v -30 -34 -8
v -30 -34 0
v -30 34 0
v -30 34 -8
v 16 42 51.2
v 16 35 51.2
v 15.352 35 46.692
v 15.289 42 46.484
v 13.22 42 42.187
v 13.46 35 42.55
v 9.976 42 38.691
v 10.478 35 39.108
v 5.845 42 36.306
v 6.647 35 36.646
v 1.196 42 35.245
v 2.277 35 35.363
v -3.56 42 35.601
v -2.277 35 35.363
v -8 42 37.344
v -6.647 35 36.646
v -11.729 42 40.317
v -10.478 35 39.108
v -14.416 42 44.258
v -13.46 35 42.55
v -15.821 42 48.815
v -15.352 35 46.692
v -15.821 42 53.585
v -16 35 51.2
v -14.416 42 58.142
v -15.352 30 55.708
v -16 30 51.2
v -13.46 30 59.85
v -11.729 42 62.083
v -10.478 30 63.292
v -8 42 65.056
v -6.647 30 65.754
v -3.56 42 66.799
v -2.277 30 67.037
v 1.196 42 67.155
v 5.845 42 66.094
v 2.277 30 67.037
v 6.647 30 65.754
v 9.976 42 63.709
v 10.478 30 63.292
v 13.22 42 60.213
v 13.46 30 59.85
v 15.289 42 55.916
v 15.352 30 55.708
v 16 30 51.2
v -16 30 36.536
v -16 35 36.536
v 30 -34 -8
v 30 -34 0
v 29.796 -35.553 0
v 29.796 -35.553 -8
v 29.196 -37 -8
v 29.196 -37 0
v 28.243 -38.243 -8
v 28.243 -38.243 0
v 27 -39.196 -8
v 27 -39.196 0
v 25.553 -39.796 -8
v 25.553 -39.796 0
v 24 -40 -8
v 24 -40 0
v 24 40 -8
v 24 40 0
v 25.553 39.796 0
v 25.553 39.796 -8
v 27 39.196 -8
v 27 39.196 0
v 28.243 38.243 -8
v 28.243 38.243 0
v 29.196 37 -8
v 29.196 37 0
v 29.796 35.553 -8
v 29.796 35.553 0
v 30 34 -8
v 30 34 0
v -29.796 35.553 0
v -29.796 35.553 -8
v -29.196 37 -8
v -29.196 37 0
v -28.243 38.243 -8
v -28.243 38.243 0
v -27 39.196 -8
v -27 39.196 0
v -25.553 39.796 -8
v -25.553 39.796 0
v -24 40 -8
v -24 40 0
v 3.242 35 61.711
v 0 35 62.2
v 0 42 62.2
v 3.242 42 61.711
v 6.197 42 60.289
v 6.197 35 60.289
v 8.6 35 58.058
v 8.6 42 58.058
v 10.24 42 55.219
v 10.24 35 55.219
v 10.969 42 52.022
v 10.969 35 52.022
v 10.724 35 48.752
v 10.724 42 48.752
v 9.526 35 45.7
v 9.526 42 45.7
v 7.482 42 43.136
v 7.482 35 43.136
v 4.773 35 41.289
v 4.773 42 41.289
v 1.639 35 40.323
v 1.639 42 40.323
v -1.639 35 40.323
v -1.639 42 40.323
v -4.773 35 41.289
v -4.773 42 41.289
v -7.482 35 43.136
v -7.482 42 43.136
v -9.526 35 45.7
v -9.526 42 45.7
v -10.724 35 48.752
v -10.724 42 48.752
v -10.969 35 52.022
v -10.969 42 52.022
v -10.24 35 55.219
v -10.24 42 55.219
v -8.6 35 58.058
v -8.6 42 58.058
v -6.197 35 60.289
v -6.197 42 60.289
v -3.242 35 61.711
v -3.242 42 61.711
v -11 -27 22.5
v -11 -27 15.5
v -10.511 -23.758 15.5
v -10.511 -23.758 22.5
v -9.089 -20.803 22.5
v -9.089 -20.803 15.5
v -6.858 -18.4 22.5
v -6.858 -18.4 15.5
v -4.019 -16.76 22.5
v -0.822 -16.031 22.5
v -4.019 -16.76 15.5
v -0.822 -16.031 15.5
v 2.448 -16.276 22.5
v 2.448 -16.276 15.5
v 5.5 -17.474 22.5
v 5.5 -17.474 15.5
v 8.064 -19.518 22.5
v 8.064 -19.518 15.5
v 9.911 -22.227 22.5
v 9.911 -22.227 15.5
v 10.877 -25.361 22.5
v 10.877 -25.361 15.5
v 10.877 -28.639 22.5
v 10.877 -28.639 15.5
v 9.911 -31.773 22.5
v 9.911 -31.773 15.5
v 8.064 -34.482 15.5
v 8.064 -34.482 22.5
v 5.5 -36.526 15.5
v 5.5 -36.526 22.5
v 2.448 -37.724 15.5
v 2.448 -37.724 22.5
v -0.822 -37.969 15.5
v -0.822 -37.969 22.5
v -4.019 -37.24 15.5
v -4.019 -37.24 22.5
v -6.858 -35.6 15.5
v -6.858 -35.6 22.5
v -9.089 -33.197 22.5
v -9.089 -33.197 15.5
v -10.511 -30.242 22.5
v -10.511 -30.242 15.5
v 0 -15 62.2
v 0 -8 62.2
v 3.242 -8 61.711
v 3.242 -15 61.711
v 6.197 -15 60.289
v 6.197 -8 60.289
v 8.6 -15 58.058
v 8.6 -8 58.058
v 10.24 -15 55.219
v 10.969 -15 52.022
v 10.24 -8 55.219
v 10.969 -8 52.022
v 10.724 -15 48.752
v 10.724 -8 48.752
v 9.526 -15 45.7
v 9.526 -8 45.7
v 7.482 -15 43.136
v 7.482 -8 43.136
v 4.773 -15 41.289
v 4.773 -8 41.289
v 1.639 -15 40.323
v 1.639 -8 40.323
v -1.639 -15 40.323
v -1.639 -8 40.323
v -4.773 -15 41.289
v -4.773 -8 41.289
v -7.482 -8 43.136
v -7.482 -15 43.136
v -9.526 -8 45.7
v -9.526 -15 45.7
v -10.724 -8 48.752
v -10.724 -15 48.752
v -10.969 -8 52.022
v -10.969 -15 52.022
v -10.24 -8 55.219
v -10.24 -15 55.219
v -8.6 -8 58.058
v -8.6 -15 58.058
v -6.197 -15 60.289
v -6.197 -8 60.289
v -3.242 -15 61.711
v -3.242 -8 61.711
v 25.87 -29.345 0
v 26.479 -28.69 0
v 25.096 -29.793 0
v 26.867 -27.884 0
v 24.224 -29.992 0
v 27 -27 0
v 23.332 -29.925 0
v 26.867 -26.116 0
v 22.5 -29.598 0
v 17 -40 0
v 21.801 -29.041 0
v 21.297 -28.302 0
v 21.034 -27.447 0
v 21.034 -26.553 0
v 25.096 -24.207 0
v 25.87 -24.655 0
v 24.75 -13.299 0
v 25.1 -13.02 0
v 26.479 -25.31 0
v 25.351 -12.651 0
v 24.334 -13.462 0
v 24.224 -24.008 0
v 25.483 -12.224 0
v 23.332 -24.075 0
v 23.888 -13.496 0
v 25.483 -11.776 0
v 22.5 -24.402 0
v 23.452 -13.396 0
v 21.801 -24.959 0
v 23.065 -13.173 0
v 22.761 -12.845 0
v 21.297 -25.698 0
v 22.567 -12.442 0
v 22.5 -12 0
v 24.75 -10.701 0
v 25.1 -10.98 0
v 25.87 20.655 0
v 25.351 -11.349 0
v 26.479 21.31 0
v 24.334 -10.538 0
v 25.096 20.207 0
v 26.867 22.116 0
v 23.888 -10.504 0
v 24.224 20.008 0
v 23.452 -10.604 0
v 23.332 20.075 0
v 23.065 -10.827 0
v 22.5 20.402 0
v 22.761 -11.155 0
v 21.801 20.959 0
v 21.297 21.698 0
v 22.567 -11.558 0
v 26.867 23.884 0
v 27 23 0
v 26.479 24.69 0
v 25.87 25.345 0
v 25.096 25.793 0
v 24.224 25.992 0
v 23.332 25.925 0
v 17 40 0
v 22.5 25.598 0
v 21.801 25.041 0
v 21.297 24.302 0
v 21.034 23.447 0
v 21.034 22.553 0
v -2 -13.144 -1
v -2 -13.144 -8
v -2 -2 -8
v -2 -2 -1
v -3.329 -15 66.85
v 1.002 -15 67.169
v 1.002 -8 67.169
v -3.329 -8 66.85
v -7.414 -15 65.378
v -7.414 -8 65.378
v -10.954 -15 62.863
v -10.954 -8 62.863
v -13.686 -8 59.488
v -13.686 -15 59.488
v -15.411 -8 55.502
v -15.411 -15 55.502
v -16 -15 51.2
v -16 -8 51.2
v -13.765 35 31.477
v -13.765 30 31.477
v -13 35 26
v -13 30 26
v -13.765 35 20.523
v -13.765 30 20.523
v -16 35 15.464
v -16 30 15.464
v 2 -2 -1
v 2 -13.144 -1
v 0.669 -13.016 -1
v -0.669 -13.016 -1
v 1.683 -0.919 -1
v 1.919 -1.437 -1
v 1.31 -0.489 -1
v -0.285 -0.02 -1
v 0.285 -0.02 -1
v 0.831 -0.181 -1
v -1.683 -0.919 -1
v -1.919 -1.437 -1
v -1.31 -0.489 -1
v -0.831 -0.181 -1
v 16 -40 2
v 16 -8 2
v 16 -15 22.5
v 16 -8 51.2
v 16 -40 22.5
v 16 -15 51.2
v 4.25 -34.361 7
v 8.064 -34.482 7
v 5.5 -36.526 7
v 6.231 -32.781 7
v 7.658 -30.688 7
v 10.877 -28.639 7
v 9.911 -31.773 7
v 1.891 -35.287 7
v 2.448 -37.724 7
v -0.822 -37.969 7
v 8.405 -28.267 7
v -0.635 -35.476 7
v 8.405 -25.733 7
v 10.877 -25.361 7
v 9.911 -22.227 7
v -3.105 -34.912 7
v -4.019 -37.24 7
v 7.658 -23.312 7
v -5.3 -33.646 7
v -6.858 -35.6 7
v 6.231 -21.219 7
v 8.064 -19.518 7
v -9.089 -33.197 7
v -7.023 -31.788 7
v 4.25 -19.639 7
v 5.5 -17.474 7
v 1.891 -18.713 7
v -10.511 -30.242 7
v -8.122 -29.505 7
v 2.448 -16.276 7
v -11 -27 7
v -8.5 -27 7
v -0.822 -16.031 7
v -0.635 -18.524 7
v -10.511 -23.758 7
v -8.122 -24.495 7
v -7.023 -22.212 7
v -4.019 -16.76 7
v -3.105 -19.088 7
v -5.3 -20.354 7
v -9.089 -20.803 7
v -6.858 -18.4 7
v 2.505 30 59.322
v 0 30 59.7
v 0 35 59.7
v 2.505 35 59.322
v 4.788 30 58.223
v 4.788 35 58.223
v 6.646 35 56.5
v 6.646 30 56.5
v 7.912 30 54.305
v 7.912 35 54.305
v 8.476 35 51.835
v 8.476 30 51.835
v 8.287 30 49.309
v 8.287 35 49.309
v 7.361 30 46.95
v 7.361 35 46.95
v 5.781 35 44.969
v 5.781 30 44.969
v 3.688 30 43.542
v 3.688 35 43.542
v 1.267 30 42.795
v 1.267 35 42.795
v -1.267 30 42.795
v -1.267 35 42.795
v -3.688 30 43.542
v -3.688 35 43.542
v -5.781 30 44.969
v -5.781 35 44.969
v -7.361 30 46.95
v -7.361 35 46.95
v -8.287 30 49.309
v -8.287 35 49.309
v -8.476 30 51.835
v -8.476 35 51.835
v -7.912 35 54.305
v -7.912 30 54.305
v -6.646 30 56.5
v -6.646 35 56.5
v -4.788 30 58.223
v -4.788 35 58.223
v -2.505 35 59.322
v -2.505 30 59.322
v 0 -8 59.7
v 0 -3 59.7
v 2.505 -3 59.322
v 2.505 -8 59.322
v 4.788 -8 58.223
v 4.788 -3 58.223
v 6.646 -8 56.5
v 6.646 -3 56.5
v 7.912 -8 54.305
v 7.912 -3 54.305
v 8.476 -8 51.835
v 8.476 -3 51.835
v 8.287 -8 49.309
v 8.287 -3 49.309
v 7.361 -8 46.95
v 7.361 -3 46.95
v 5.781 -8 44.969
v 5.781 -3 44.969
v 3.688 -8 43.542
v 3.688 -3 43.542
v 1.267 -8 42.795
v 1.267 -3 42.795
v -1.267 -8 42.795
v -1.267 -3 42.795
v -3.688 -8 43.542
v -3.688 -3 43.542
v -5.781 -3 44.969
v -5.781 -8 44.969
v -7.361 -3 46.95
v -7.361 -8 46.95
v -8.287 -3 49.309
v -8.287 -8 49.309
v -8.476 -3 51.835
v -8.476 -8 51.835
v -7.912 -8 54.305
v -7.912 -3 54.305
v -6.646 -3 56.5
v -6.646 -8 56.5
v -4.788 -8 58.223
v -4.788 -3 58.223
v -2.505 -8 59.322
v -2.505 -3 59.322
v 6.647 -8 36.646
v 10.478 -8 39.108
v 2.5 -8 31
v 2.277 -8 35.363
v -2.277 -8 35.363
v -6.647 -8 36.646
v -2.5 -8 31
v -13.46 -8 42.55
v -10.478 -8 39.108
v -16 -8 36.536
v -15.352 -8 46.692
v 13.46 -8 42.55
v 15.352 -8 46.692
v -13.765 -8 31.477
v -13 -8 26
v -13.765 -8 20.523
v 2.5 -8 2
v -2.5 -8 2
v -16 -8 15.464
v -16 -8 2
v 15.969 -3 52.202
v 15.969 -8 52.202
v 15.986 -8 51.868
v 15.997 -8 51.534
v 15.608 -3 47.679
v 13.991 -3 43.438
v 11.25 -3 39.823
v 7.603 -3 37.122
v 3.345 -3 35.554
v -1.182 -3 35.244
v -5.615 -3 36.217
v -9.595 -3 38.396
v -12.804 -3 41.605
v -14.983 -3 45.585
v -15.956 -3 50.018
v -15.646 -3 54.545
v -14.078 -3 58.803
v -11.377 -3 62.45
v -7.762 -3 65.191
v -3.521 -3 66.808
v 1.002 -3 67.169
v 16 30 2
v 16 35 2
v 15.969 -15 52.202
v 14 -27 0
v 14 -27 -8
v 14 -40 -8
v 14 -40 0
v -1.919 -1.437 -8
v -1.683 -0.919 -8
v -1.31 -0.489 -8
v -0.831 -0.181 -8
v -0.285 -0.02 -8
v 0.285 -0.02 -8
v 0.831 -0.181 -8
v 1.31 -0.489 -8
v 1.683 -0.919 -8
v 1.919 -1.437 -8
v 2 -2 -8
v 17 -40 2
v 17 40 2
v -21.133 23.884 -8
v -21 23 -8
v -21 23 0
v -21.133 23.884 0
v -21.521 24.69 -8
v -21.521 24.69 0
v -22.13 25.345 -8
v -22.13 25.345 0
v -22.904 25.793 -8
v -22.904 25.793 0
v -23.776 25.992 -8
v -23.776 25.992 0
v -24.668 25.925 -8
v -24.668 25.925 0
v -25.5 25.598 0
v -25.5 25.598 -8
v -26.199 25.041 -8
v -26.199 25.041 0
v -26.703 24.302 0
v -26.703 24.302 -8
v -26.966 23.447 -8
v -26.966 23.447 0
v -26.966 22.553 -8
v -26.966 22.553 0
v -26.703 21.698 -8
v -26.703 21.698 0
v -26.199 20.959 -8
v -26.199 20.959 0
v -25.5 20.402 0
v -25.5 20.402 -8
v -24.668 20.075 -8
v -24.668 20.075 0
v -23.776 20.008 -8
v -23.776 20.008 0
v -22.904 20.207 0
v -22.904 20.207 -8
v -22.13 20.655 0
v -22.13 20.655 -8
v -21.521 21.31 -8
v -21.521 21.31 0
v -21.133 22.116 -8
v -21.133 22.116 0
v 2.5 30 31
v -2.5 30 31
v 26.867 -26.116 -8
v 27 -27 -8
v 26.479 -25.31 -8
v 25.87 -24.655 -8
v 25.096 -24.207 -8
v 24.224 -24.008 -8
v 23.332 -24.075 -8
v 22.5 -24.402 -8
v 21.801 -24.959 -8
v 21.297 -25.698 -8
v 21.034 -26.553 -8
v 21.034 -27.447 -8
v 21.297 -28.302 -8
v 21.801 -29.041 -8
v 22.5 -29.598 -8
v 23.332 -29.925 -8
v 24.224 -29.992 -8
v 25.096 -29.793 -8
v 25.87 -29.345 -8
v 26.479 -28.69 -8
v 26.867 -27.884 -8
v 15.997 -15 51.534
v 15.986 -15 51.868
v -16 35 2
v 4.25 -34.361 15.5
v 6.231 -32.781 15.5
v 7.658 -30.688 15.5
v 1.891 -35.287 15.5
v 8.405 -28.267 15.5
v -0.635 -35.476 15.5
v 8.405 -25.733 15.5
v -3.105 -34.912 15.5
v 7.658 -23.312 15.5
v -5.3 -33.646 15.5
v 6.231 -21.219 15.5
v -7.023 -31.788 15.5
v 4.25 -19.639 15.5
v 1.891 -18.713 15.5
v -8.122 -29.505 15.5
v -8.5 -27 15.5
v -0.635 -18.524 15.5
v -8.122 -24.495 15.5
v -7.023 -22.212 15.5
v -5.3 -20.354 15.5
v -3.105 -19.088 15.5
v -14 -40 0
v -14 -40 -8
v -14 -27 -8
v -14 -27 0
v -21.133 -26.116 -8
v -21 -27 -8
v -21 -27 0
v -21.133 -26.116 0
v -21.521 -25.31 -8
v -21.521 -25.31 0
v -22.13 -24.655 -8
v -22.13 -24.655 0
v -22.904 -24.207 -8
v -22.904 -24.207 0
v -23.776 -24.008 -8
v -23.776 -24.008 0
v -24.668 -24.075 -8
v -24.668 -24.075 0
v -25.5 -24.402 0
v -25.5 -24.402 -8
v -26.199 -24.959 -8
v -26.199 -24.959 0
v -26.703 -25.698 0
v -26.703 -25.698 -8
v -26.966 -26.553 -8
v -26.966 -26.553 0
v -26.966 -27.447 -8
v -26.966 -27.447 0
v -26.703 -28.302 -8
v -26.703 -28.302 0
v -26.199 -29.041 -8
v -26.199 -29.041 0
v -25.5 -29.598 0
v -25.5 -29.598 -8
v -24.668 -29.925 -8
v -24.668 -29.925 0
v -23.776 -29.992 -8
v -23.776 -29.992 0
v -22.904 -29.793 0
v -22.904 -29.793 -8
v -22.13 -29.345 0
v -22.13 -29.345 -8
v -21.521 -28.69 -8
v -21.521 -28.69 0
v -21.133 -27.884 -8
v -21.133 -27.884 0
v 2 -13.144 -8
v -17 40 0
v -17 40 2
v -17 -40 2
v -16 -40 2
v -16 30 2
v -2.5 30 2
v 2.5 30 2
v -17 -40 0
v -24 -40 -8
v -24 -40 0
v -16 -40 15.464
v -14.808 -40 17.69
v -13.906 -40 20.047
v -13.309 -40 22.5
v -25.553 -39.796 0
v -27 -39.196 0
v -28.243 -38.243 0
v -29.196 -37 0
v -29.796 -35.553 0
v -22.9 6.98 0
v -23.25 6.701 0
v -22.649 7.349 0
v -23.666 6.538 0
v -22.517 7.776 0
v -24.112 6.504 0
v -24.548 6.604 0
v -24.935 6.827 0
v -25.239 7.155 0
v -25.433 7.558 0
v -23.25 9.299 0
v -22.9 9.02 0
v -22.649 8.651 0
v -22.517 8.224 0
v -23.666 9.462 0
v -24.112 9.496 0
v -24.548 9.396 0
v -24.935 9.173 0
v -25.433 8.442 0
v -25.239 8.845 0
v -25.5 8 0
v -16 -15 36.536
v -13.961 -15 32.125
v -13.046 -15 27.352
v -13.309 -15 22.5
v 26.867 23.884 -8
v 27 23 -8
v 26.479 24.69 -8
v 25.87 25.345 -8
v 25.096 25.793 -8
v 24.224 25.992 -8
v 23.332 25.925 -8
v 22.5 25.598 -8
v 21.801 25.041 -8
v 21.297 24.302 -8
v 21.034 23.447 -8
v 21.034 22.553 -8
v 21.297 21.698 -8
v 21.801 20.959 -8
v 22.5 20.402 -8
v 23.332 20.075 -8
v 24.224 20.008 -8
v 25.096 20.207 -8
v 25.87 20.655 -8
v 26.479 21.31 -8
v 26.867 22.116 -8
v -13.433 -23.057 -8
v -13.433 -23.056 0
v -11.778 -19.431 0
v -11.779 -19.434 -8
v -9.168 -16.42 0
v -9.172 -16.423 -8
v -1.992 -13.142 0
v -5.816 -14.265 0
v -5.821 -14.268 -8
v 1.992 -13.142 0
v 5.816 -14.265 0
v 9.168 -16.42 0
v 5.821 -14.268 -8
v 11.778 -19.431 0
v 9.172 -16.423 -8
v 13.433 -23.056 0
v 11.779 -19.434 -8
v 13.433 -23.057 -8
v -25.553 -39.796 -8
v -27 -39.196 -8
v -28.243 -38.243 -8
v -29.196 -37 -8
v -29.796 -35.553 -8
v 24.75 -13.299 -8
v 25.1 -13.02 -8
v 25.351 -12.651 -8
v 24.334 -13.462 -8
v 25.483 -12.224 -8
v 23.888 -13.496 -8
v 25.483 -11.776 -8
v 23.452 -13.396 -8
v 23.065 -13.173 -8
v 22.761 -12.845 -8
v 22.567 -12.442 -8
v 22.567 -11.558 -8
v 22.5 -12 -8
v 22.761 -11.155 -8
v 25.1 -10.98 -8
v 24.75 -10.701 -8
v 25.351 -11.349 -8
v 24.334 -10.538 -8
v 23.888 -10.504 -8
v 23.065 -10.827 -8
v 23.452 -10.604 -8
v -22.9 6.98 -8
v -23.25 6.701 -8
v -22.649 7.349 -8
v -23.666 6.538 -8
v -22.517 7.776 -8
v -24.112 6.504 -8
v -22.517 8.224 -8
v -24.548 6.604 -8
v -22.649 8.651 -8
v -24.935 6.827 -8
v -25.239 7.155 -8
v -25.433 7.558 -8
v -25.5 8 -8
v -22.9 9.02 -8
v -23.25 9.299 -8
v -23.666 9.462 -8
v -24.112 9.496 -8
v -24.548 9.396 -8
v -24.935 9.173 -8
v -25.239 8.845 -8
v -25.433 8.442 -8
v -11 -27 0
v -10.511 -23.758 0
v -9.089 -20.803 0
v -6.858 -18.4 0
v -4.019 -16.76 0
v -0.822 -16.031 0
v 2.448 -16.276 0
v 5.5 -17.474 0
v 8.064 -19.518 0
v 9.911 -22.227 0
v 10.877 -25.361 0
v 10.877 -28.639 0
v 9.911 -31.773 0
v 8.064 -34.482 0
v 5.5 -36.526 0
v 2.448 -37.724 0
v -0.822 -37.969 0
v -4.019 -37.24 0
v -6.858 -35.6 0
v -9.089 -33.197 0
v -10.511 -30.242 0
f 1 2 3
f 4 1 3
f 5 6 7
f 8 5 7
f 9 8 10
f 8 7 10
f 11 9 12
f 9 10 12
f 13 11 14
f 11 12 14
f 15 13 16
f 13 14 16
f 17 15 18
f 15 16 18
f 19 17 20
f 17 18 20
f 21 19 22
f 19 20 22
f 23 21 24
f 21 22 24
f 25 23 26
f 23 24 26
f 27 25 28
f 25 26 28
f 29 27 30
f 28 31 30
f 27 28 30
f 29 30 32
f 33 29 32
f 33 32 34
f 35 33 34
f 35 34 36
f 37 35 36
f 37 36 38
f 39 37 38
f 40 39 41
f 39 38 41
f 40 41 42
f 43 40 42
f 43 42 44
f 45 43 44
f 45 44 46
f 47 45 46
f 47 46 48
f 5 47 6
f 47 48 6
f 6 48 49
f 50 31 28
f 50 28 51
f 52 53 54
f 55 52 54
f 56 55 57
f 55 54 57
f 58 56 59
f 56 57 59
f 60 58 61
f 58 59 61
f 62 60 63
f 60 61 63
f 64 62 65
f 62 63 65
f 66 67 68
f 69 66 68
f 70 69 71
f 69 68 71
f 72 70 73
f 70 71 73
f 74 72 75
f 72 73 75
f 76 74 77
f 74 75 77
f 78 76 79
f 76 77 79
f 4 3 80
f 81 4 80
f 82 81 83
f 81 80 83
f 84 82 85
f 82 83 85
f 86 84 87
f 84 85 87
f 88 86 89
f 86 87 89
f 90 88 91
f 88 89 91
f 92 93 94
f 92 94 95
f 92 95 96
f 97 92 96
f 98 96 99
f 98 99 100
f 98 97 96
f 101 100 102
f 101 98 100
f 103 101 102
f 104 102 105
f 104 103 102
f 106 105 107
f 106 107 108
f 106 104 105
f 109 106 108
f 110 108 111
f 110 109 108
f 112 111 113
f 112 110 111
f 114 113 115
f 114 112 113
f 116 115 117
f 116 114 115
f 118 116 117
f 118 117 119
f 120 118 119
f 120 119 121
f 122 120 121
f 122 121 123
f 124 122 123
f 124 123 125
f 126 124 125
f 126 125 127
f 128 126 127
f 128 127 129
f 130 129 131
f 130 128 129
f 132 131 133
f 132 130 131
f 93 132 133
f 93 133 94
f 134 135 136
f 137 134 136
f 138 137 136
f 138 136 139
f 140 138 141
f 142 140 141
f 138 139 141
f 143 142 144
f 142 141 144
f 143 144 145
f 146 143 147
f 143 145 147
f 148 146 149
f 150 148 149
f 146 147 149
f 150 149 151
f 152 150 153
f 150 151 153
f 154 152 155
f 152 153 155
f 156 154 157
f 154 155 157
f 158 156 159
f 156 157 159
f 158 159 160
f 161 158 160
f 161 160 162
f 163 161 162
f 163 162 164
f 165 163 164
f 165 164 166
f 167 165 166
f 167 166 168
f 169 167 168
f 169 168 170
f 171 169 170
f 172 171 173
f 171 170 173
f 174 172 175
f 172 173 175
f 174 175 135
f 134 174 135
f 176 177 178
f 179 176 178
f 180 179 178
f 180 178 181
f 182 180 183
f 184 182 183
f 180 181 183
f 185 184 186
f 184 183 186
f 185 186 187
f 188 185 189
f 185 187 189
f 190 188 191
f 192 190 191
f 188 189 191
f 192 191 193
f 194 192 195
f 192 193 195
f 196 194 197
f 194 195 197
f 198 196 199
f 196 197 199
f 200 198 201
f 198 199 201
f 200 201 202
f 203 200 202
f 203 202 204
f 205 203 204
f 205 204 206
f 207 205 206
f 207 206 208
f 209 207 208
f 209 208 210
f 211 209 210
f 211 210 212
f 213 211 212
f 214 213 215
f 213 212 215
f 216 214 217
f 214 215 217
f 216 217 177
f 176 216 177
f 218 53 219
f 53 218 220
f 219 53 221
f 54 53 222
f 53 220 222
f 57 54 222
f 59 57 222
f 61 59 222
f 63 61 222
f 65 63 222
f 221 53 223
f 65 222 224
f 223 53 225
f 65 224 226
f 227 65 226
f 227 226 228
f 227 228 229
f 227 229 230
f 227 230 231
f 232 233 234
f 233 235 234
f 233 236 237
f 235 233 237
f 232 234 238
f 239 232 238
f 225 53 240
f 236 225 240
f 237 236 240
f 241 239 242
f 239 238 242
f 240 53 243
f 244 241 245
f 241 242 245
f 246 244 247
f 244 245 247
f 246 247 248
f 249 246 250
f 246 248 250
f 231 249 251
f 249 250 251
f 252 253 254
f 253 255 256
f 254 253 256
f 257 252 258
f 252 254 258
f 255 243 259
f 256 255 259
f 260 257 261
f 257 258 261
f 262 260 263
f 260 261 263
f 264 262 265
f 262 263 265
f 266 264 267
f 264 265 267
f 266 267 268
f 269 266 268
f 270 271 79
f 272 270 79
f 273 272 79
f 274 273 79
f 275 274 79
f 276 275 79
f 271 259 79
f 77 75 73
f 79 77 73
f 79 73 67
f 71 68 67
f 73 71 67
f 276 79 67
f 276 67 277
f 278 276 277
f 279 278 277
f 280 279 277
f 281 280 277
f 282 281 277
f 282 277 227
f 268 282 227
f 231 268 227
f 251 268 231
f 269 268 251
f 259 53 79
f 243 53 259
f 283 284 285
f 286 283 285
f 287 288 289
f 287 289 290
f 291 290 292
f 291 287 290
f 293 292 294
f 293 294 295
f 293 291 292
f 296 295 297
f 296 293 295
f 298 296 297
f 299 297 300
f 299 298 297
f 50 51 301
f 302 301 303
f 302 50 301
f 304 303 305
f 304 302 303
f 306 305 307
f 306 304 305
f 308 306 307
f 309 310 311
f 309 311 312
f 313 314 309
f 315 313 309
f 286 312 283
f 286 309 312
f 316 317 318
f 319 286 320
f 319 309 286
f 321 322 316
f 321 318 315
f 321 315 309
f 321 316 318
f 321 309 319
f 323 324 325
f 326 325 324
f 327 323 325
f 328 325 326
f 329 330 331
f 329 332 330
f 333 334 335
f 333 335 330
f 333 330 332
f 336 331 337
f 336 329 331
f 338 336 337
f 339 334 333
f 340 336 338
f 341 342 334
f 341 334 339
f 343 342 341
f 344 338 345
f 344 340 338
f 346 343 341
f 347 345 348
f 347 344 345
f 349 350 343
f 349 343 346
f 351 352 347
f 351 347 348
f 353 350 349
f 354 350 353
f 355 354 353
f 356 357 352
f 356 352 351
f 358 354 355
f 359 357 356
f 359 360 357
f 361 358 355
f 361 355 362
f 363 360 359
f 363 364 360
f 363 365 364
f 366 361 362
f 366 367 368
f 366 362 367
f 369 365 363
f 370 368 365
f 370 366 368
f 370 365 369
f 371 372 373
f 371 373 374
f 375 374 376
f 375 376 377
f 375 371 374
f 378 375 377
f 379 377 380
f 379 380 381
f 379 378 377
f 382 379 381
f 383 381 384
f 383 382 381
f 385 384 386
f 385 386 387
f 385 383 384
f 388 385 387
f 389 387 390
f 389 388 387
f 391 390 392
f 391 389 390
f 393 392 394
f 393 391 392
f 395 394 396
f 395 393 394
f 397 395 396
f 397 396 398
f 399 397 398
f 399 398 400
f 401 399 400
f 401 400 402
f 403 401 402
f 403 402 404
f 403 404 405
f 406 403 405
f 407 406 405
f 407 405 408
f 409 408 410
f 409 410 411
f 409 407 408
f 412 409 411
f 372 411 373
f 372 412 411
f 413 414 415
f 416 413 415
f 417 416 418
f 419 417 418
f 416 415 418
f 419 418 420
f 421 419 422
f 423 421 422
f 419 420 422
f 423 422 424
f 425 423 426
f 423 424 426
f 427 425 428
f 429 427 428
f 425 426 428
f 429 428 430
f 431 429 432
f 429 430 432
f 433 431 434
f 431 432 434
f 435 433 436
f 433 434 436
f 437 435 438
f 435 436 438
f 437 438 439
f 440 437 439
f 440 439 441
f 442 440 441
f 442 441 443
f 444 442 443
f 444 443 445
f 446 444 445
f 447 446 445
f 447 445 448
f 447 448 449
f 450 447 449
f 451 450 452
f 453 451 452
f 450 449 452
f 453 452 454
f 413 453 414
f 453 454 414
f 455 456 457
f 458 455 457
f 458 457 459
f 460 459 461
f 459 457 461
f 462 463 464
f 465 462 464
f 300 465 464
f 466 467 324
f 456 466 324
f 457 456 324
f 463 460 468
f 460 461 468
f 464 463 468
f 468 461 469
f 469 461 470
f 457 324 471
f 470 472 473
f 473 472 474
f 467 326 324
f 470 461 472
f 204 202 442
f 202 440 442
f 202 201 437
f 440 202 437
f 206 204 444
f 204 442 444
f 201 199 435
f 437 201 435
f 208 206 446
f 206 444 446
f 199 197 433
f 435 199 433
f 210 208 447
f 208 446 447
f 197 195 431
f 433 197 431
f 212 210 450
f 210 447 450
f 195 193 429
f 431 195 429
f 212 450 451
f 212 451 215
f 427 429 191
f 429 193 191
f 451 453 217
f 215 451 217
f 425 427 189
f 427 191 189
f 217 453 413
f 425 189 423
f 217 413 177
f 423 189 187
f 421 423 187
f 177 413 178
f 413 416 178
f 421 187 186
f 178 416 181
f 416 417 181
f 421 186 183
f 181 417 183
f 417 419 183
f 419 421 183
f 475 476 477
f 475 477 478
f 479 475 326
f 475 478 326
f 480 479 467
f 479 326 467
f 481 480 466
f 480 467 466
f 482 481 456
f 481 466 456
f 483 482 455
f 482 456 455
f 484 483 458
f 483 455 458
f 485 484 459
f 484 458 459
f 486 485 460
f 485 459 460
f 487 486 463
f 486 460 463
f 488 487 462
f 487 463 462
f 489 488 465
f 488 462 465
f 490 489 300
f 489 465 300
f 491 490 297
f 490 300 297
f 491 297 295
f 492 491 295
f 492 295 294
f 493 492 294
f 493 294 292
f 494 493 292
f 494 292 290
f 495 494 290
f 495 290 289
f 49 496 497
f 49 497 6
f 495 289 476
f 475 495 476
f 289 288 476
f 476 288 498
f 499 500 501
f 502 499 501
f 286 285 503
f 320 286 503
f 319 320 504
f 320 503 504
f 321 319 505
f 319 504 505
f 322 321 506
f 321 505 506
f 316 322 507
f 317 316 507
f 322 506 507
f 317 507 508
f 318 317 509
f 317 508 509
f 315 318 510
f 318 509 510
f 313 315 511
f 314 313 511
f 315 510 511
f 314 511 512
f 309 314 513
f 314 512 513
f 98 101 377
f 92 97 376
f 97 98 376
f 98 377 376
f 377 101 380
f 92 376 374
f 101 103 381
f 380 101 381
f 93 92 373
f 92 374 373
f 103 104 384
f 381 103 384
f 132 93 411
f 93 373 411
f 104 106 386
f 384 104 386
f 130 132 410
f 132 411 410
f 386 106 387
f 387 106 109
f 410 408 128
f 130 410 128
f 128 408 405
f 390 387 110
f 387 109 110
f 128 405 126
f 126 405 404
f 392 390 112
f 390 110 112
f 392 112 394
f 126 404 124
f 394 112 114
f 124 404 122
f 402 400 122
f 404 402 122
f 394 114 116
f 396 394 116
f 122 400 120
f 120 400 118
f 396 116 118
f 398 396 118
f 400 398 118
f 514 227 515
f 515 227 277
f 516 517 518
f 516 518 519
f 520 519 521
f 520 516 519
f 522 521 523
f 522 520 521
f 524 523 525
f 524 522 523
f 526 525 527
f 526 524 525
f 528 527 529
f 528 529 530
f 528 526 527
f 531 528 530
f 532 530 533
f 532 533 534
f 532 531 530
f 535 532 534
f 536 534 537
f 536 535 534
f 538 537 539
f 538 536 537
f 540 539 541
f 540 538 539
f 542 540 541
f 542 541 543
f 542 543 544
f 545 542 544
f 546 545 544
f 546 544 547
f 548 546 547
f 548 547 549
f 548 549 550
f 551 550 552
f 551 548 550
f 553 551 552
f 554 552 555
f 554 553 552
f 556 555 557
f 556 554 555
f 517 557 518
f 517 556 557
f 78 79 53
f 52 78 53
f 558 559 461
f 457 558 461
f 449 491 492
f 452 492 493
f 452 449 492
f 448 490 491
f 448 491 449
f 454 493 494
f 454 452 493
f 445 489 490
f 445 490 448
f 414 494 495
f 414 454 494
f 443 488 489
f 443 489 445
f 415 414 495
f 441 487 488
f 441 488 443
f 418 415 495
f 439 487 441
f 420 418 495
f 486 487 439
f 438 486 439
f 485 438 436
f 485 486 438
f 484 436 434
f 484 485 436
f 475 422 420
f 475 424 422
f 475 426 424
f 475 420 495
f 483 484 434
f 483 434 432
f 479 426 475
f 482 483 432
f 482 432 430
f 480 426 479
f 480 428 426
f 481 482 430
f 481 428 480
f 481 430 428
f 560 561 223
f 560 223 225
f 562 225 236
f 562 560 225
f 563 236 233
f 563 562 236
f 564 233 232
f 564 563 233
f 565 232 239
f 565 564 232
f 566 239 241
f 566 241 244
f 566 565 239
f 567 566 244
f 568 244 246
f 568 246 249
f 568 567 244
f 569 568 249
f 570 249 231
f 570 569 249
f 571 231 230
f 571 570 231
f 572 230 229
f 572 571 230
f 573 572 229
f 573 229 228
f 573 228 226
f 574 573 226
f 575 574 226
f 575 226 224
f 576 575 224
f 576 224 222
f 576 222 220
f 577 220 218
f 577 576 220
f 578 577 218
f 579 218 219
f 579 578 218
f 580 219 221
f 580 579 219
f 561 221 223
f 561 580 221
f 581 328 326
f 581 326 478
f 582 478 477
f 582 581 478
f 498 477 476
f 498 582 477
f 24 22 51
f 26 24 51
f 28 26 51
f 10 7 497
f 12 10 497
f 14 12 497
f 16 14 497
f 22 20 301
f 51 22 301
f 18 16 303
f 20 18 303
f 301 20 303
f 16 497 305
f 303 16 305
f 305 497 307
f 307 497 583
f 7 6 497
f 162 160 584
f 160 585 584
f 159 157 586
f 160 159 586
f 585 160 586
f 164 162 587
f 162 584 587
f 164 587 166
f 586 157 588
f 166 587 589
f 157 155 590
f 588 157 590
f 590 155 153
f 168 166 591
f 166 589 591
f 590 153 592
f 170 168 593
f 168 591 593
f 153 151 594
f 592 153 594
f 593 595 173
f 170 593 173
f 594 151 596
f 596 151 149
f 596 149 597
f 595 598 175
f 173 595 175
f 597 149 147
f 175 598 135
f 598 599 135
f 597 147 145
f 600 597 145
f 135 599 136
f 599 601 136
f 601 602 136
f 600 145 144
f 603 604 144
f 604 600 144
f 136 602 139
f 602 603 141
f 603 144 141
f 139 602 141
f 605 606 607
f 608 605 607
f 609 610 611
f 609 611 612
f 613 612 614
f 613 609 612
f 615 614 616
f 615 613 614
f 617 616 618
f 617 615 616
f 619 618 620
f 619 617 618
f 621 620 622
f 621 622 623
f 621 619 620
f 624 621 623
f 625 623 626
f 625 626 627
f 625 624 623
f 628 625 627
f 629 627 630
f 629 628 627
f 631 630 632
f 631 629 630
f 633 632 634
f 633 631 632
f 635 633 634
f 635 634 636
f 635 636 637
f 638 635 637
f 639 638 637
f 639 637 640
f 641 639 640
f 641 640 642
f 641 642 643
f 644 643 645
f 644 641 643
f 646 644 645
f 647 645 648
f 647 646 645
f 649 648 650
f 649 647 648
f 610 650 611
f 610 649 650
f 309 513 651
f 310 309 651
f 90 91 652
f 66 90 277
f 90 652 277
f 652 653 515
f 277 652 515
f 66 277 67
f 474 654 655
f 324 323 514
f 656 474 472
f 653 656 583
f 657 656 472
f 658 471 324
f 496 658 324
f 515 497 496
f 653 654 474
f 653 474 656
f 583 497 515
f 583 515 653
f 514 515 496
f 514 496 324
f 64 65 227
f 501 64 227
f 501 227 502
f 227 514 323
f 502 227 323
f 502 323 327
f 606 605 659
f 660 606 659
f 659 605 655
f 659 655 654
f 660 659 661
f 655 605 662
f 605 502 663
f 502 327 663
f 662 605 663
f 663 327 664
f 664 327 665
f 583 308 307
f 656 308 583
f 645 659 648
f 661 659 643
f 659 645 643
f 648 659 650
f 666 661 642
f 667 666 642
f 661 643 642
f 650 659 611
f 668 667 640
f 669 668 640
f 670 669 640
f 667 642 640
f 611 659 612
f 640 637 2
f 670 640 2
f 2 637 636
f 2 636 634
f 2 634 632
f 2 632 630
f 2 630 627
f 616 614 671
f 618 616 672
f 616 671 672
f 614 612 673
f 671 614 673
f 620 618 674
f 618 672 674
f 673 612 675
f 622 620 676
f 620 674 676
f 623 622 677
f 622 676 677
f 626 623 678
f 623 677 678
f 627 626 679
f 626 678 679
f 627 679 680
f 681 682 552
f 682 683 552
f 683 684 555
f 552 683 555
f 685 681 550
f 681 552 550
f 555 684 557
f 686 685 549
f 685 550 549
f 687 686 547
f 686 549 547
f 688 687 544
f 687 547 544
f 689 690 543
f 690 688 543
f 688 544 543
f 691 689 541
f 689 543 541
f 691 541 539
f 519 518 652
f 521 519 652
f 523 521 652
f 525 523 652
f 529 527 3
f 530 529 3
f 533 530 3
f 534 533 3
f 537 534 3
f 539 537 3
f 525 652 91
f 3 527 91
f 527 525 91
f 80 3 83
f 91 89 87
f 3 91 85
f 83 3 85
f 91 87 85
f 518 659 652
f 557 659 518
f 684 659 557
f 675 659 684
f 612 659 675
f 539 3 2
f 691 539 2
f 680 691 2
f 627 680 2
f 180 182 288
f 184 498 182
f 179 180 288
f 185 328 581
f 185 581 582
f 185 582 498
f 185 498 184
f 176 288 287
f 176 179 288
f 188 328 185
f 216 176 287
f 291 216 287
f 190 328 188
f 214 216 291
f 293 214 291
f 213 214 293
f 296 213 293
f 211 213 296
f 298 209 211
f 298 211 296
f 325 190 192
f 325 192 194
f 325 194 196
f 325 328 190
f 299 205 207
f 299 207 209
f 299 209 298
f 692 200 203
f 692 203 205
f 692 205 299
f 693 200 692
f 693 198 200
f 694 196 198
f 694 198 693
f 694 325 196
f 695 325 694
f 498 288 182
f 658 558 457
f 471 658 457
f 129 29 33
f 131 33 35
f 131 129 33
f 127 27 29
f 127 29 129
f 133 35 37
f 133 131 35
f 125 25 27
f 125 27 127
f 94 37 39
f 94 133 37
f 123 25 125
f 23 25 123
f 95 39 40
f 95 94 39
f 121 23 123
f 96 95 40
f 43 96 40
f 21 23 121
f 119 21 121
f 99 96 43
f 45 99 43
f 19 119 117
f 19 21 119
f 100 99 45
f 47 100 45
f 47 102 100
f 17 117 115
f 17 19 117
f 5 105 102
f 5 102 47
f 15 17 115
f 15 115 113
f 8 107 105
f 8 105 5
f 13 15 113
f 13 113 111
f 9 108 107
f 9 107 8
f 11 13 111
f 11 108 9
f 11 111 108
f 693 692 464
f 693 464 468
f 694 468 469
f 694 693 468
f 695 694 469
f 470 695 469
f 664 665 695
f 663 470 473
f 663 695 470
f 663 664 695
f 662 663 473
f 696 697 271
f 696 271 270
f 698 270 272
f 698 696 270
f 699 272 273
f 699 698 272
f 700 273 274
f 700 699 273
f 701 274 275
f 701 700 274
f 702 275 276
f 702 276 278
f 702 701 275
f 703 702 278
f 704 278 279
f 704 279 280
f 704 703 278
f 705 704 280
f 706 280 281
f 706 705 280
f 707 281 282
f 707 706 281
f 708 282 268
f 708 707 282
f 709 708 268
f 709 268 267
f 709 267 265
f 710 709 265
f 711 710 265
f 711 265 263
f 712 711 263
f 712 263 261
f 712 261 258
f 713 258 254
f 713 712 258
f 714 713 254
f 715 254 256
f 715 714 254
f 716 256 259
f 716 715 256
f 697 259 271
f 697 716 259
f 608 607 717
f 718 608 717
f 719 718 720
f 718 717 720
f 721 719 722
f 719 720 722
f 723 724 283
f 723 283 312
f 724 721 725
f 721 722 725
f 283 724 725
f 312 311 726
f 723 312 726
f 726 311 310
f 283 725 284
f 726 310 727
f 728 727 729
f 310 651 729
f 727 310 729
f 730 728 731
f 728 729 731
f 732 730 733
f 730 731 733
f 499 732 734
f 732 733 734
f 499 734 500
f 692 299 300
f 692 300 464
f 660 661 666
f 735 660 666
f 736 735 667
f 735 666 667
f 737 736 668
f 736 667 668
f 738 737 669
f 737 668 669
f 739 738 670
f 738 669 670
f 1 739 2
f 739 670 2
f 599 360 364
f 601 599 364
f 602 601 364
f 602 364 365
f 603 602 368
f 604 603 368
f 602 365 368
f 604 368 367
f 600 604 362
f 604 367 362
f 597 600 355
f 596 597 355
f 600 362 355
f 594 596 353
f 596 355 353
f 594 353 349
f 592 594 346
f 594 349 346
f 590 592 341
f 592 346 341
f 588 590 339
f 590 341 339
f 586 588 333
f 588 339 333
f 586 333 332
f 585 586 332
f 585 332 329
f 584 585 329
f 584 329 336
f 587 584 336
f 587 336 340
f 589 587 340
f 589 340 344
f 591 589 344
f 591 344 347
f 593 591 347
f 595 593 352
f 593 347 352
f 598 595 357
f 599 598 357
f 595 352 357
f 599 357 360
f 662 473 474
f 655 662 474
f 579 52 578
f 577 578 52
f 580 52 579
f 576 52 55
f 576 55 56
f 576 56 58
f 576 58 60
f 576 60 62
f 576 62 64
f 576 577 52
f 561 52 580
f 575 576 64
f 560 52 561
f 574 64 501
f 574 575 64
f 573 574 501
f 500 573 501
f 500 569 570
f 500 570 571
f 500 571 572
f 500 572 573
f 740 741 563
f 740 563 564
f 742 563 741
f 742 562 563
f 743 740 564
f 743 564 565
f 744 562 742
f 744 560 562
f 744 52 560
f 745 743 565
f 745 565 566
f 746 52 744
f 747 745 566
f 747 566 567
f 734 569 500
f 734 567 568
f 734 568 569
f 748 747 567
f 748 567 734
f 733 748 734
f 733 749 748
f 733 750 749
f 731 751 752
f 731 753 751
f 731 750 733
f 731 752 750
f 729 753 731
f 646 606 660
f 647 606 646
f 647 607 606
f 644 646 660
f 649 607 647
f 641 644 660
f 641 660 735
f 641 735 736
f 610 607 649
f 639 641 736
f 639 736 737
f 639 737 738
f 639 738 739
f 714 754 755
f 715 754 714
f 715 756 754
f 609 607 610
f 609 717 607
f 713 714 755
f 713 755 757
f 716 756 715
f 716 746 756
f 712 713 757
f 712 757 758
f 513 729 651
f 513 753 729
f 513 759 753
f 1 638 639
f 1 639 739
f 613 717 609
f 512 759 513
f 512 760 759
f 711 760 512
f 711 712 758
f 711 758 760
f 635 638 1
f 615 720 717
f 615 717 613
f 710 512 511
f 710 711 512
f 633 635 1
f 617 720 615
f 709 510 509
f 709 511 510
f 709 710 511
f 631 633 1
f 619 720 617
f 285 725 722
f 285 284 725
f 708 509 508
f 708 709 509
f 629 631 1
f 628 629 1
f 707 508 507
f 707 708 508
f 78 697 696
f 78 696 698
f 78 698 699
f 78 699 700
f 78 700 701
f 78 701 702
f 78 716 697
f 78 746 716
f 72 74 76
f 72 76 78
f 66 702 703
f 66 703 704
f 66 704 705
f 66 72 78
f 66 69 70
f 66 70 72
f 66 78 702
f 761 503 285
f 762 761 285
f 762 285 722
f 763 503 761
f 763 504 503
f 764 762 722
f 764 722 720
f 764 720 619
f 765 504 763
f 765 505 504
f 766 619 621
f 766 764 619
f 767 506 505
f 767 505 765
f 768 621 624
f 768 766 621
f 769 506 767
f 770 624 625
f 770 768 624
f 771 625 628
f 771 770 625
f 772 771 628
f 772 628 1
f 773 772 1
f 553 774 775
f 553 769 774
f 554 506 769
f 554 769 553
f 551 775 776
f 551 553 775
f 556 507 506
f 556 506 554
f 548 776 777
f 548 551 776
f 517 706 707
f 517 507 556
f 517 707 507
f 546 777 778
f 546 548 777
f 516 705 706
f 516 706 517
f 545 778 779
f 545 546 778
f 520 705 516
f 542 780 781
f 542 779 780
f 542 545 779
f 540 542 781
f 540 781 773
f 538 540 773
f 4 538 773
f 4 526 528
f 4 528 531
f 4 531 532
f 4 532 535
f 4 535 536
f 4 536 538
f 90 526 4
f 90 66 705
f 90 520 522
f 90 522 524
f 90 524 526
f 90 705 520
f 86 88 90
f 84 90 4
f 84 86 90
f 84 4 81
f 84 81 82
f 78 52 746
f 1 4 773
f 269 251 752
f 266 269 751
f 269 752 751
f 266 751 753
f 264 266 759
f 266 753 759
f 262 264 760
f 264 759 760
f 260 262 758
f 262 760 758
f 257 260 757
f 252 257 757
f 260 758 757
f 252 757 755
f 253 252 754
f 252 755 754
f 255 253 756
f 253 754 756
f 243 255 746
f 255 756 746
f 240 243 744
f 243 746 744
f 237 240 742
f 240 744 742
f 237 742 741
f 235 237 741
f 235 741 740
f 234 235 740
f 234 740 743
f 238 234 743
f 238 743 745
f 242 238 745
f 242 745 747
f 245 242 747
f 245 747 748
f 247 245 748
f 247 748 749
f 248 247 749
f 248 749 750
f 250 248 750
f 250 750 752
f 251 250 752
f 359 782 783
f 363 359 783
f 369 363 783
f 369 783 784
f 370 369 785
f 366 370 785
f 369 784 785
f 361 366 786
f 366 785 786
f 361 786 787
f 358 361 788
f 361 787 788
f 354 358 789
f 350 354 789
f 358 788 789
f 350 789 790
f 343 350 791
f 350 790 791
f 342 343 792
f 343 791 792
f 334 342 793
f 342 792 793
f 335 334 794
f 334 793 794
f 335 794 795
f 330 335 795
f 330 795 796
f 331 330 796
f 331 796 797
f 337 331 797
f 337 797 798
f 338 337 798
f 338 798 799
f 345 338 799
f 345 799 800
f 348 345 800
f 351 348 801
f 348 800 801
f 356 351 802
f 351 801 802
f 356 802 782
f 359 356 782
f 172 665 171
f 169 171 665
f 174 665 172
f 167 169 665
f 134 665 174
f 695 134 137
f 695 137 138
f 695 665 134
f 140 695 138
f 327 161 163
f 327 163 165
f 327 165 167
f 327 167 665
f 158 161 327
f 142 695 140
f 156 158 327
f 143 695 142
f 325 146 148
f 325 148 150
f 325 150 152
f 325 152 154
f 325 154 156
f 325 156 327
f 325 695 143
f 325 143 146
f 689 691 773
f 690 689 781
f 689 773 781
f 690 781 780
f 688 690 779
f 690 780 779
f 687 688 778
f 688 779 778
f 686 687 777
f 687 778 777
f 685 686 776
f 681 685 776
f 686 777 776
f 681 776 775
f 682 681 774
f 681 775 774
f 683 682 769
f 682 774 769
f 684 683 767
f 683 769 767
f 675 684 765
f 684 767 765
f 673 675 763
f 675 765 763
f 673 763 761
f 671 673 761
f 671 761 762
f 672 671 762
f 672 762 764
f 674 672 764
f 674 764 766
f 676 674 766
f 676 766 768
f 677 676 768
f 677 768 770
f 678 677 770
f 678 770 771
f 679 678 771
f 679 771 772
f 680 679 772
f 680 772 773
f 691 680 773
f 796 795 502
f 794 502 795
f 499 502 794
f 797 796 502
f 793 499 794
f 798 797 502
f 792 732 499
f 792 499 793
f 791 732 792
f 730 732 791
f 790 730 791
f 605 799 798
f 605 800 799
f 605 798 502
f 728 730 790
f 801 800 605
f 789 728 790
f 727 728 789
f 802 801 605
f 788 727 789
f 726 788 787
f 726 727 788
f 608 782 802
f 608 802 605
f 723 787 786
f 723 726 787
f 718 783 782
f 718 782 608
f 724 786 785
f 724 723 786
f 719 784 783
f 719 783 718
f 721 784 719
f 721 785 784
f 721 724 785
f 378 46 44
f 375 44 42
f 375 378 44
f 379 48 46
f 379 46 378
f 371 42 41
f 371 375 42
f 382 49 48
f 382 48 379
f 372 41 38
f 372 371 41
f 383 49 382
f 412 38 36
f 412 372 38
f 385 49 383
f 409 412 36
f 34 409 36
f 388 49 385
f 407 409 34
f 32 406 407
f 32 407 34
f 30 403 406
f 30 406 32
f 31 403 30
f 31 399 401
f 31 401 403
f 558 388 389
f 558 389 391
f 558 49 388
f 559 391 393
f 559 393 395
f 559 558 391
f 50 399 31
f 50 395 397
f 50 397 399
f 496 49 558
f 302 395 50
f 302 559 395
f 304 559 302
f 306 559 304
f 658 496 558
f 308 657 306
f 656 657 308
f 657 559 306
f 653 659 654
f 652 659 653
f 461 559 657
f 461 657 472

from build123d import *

# Parameters (mm, degrees)
EXTRUDE_1_DEPTH           = 8
SKETCH_3_W                = 34
SKETCH_3_H                = 80
EXTRUDE_2_DEPTH           = 2
CUT_EXTRUDE_1_DEPTH       = 8
CUT_EXTRUDE_2_DEPTH       = 7
SKETCH_6_W                = 32
SKETCH_6_H                = 25
EXTRUDE_4_DEPTH           = 20.5
SKETCH_7_R                = 11
CUT_EXTRUDE_5_DEPTH       = 7
SKETCH_8_R                = 8.5
CUT_EXTRUDE_6_DEPTH       = 8.5
SKETCH_9_R                = 11
CUT_EXTRUDE_7_DEPTH       = 7
EXTRUDE_5_DEPTH           = 7
EXTRUDE_6_DEPTH           = 5
SKETCH_13_R               = 8.5
CUT_EXTRUDE_8_DEPTH       = 5
SKETCH_14_R               = 11
CUT_EXTRUDE_9_DEPTH       = 7
SKETCH_15_R               = 8.5
EXTRUDE_7_DEPTH           = 5
SKETCH_16_R               = 16
SKETCH_16_R_2             = 11
EXTRUDE_8_DEPTH           = 7
F_6_0MM_START             = -8
F_6_0MM_1_OUTLINE_R       = 3
F_6_0MM_1_DEPTH           = 8
F_3_0MM_1_D               = 3
RIB_13_REACH              = 86.734
SKETCH_21_WALL_W          = 209.467873062
SKETCH_21_WALL_H          = 5
CUT_EXTRUDE_10_DEPTH      = 102.56692375
CUT_EXTRUDE_10_DEPTH_BACK = 102.56692375
SKETCH_23_R               = 20


# Read off the part's stored shape, not the designer's step: Ø6.0mm 暗销孔1
with BuildPart() as part:
    # 草图1 → 凸台-拉伸1 (new body)
    with BuildSketch(Plane.XY):
        with BuildLine():
            Line((24, -40), (-24, -40))
            ThreePointArc((-24, -40), (-28.242640687, -38.242640687), (-30, -34))
            Line((-30, -34), (-30, 34))
            ThreePointArc((-30, 34), (-28.242640687, 38.242640687), (-24, 40))
            Line((-24, 40), (24, 40))
            ThreePointArc((24, 40), (28.242640687, 38.242640687), (30, 34))
            Line((30, 34), (30, -34))
            ThreePointArc((30, -34), (28.242640687, -38.242640687), (24, -40))
        make_face()
    extrude(amount=-EXTRUDE_1_DEPTH)

    # 草图3 → 凸台-拉伸2 (add)
    with BuildSketch(Plane.XY):
        Rectangle(SKETCH_3_W, SKETCH_3_H)
    extrude(amount=EXTRUDE_2_DEPTH)

    # 草图4 → 切除-拉伸1 (cut)
    with BuildSketch(Plane(origin=(0, 0, -8), x_dir=(-1, 0, 0), z_dir=(0, 0, -1))):
        with BuildLine():
            Line((-14, -27), (-14, -40))
            Line((-14, -40), (14, -40))
            Line((14, -40), (14, -27))
            ThreePointArc((14, -27), (0, -13), (-14, -27))
        make_face()
    extrude(amount=-CUT_EXTRUDE_1_DEPTH, mode=Mode.SUBTRACT)

    # 草图5 → 切除-拉伸2 (cut)
    with BuildSketch(Plane(origin=(0, 0, -8), x_dir=(-1, 0, 0), z_dir=(0, 0, -1))):
        with BuildLine():
            Line((-2, -2), (-2, -13.143593539))
            ThreePointArc((-2, -13.143593539), (0, -13), (2, -13.143593539))
            Line((2, -13.143593539), (2, -2))
            ThreePointArc((2, -2), (0, 0), (-2, -2))
        make_face()
    extrude(amount=-CUT_EXTRUDE_2_DEPTH, mode=Mode.SUBTRACT)

    # 草图6 → 凸台-拉伸4 (add)
    with BuildSketch(Plane.XY.offset(2)):
        with Locations((0, -27.5)):
            Rectangle(SKETCH_6_W, SKETCH_6_H)
    extrude(amount=EXTRUDE_4_DEPTH)

    # 草图7 → 切除-拉伸5 (cut)
    with BuildSketch(Plane(origin=(0, 0, 0), x_dir=(-1, 0, 0), z_dir=(0, 0, -1))):
        with Locations((0, -27)):
            Circle(SKETCH_7_R)
    extrude(amount=-CUT_EXTRUDE_5_DEPTH, mode=Mode.SUBTRACT)

    # 草图8 → 切除-拉伸6 (cut)
    with BuildSketch(Plane(origin=(0, 0, 7), x_dir=(-1, 0, 0), z_dir=(0, 0, -1))):
        with Locations((0, -27)):
            Circle(SKETCH_8_R)
    extrude(amount=-CUT_EXTRUDE_6_DEPTH, mode=Mode.SUBTRACT)

    # 草图9 → 切除-拉伸7 (cut)
    with BuildSketch(Plane(origin=(0, 0, 15.5), x_dir=(-1, 0, 0), z_dir=(0, 0, -1))):
        with Locations((0, -27)):
            Circle(SKETCH_9_R)
    extrude(amount=-CUT_EXTRUDE_7_DEPTH, mode=Mode.SUBTRACT)

    # 草图11 → 凸台-拉伸5 (add)
    with BuildSketch(Plane(origin=(0, -15, 0), x_dir=(1, 0, 0), z_dir=(0, 1, 0))):
        with BuildLine():
            Line((-16, -2), (16, -2))
            Line((16, -2), (16, -51.2))
            ThreePointArc((16, -51.2), (15.99214711, -51.701229307), (15.968596148, -52.201966601))
            Line((15.968596148, -52.201966601), (1.001966601, -67.168596148))
            ThreePointArc((1.001966601, -67.168596148), (-10.953733026, -62.862578309), (-16, -51.2))
            Line((-16, -51.2), (-16, -2))
        make_face()
    extrude(amount=EXTRUDE_5_DEPTH)

    # 草图12 → 凸台-拉伸6 (add)
    with BuildSketch(Plane(origin=(0, -8, 0), x_dir=(1, 0, 0), z_dir=(0, 1, 0))):
        with BuildLine():
            Line((1.001966601, -67.168596148), (15.968596148, -52.201966601))
            ThreePointArc((15.968596148, -52.201966601), (-11.313708499, -39.886291501), (1.001966601, -67.168596148))
        make_face()
    extrude(amount=EXTRUDE_6_DEPTH)

    # 草图13 → 切除-拉伸8 (cut)
    with BuildSketch(Plane(origin=(0, -3, 0), x_dir=(1, 0, 0), z_dir=(0, 1, 0))):
        with Locations(Location((0, -51.2, 0), (0, 0, 270))):
            Circle(SKETCH_13_R)
    extrude(amount=-CUT_EXTRUDE_8_DEPTH, mode=Mode.SUBTRACT)

    # 草图14 → 切除-拉伸9 (cut)
    with BuildSketch(Plane(origin=(0, -8, 0), x_dir=(1, 0, 0), z_dir=(0, 1, 0))):
        with Locations(Location((0, -51.2, 0), (0, 0, 270))):
            Circle(SKETCH_14_R)
    extrude(amount=-CUT_EXTRUDE_9_DEPTH, mode=Mode.SUBTRACT)

    # 草图15 → 凸台-拉伸7 (add)
    with BuildSketch(Plane(origin=(0, 30, 0), x_dir=(1, 0, 0), z_dir=(0, 1, 0))):
        with BuildLine():
            Line((-16, -2), (16, -2))
            Line((16, -2), (16, -51.2))
            ThreePointArc((16, -51.2), (0, -67.2), (-16, -51.2))
            Line((-16, -51.2), (-16, -2))
        make_face()
        with Locations(Location((0, -51.2, 0), (0, 0, 270))):
            Circle(SKETCH_15_R, mode=Mode.SUBTRACT)
    extrude(amount=EXTRUDE_7_DEPTH)

    # 草图16 → 凸台-拉伸8 (add)
    with BuildSketch(Plane(origin=(0, 35, 0), x_dir=(1, 0, 0), z_dir=(0, 1, 0))):
        with Locations((0, -51.2)):
            Circle(SKETCH_16_R)
        with Locations(Location((0, -51.2, 0), (0, 0, 270))):
            Circle(SKETCH_16_R_2, mode=Mode.SUBTRACT)
    extrude(amount=EXTRUDE_8_DEPTH)

    # Ø6.0mm 暗销孔1 outline → Ø6.0mm 暗销孔1 (cut)
    with BuildSketch(Plane.XY.offset(F_6_0MM_START)):
        with Locations((-24, -27)):
            Circle(F_6_0MM_1_OUTLINE_R)
        with Locations((24, 23)):
            Circle(F_6_0MM_1_OUTLINE_R)
        with Locations((24, -27)):
            Circle(F_6_0MM_1_OUTLINE_R)
        with Locations((-24, 23)):
            Circle(F_6_0MM_1_OUTLINE_R)
    extrude(amount=F_6_0MM_1_DEPTH, mode=Mode.SUBTRACT)

    # Ø3.0mm 暗销孔1 (through all)
    with Locations(Plane.XY):
        with Locations((24, -12), (-24, 8)):
            Hole(F_3_0MM_1_D / 2)

    # 草图21 wall → 筋13 (add, up to next)
    with BuildSketch(Plane(origin=(0, 11, 31), x_dir=(0, -1, 0), z_dir=(0, 0, -1)), mode=Mode.PRIVATE) as rib_13_sk1:
        Rectangle(SKETCH_21_WALL_W, SKETCH_21_WALL_H)
    rib_13_tool1 = extrude(rib_13_sk1.sketch, amount=RIB_13_REACH, mode=Mode.PRIVATE) - part.part
    add(rib_13_tool1.solids().sort_by_distance((0, 11, 31))[0])

    # 草图23 → 切除-拉伸10 (cut, two sides: drawn at the far end of the back side and taken through both)
    with BuildSketch(Plane(origin=(0, 30, 0), x_dir=(1, 0, 0), z_dir=(0, 1, 0)).offset(-CUT_EXTRUDE_10_DEPTH_BACK)):
        with Locations((-33, -26)):
            Circle(SKETCH_23_R)
    extrude(amount=CUT_EXTRUDE_10_DEPTH + CUT_EXTRUDE_10_DEPTH_BACK, mode=Mode.SUBTRACT)


solid = part.part
